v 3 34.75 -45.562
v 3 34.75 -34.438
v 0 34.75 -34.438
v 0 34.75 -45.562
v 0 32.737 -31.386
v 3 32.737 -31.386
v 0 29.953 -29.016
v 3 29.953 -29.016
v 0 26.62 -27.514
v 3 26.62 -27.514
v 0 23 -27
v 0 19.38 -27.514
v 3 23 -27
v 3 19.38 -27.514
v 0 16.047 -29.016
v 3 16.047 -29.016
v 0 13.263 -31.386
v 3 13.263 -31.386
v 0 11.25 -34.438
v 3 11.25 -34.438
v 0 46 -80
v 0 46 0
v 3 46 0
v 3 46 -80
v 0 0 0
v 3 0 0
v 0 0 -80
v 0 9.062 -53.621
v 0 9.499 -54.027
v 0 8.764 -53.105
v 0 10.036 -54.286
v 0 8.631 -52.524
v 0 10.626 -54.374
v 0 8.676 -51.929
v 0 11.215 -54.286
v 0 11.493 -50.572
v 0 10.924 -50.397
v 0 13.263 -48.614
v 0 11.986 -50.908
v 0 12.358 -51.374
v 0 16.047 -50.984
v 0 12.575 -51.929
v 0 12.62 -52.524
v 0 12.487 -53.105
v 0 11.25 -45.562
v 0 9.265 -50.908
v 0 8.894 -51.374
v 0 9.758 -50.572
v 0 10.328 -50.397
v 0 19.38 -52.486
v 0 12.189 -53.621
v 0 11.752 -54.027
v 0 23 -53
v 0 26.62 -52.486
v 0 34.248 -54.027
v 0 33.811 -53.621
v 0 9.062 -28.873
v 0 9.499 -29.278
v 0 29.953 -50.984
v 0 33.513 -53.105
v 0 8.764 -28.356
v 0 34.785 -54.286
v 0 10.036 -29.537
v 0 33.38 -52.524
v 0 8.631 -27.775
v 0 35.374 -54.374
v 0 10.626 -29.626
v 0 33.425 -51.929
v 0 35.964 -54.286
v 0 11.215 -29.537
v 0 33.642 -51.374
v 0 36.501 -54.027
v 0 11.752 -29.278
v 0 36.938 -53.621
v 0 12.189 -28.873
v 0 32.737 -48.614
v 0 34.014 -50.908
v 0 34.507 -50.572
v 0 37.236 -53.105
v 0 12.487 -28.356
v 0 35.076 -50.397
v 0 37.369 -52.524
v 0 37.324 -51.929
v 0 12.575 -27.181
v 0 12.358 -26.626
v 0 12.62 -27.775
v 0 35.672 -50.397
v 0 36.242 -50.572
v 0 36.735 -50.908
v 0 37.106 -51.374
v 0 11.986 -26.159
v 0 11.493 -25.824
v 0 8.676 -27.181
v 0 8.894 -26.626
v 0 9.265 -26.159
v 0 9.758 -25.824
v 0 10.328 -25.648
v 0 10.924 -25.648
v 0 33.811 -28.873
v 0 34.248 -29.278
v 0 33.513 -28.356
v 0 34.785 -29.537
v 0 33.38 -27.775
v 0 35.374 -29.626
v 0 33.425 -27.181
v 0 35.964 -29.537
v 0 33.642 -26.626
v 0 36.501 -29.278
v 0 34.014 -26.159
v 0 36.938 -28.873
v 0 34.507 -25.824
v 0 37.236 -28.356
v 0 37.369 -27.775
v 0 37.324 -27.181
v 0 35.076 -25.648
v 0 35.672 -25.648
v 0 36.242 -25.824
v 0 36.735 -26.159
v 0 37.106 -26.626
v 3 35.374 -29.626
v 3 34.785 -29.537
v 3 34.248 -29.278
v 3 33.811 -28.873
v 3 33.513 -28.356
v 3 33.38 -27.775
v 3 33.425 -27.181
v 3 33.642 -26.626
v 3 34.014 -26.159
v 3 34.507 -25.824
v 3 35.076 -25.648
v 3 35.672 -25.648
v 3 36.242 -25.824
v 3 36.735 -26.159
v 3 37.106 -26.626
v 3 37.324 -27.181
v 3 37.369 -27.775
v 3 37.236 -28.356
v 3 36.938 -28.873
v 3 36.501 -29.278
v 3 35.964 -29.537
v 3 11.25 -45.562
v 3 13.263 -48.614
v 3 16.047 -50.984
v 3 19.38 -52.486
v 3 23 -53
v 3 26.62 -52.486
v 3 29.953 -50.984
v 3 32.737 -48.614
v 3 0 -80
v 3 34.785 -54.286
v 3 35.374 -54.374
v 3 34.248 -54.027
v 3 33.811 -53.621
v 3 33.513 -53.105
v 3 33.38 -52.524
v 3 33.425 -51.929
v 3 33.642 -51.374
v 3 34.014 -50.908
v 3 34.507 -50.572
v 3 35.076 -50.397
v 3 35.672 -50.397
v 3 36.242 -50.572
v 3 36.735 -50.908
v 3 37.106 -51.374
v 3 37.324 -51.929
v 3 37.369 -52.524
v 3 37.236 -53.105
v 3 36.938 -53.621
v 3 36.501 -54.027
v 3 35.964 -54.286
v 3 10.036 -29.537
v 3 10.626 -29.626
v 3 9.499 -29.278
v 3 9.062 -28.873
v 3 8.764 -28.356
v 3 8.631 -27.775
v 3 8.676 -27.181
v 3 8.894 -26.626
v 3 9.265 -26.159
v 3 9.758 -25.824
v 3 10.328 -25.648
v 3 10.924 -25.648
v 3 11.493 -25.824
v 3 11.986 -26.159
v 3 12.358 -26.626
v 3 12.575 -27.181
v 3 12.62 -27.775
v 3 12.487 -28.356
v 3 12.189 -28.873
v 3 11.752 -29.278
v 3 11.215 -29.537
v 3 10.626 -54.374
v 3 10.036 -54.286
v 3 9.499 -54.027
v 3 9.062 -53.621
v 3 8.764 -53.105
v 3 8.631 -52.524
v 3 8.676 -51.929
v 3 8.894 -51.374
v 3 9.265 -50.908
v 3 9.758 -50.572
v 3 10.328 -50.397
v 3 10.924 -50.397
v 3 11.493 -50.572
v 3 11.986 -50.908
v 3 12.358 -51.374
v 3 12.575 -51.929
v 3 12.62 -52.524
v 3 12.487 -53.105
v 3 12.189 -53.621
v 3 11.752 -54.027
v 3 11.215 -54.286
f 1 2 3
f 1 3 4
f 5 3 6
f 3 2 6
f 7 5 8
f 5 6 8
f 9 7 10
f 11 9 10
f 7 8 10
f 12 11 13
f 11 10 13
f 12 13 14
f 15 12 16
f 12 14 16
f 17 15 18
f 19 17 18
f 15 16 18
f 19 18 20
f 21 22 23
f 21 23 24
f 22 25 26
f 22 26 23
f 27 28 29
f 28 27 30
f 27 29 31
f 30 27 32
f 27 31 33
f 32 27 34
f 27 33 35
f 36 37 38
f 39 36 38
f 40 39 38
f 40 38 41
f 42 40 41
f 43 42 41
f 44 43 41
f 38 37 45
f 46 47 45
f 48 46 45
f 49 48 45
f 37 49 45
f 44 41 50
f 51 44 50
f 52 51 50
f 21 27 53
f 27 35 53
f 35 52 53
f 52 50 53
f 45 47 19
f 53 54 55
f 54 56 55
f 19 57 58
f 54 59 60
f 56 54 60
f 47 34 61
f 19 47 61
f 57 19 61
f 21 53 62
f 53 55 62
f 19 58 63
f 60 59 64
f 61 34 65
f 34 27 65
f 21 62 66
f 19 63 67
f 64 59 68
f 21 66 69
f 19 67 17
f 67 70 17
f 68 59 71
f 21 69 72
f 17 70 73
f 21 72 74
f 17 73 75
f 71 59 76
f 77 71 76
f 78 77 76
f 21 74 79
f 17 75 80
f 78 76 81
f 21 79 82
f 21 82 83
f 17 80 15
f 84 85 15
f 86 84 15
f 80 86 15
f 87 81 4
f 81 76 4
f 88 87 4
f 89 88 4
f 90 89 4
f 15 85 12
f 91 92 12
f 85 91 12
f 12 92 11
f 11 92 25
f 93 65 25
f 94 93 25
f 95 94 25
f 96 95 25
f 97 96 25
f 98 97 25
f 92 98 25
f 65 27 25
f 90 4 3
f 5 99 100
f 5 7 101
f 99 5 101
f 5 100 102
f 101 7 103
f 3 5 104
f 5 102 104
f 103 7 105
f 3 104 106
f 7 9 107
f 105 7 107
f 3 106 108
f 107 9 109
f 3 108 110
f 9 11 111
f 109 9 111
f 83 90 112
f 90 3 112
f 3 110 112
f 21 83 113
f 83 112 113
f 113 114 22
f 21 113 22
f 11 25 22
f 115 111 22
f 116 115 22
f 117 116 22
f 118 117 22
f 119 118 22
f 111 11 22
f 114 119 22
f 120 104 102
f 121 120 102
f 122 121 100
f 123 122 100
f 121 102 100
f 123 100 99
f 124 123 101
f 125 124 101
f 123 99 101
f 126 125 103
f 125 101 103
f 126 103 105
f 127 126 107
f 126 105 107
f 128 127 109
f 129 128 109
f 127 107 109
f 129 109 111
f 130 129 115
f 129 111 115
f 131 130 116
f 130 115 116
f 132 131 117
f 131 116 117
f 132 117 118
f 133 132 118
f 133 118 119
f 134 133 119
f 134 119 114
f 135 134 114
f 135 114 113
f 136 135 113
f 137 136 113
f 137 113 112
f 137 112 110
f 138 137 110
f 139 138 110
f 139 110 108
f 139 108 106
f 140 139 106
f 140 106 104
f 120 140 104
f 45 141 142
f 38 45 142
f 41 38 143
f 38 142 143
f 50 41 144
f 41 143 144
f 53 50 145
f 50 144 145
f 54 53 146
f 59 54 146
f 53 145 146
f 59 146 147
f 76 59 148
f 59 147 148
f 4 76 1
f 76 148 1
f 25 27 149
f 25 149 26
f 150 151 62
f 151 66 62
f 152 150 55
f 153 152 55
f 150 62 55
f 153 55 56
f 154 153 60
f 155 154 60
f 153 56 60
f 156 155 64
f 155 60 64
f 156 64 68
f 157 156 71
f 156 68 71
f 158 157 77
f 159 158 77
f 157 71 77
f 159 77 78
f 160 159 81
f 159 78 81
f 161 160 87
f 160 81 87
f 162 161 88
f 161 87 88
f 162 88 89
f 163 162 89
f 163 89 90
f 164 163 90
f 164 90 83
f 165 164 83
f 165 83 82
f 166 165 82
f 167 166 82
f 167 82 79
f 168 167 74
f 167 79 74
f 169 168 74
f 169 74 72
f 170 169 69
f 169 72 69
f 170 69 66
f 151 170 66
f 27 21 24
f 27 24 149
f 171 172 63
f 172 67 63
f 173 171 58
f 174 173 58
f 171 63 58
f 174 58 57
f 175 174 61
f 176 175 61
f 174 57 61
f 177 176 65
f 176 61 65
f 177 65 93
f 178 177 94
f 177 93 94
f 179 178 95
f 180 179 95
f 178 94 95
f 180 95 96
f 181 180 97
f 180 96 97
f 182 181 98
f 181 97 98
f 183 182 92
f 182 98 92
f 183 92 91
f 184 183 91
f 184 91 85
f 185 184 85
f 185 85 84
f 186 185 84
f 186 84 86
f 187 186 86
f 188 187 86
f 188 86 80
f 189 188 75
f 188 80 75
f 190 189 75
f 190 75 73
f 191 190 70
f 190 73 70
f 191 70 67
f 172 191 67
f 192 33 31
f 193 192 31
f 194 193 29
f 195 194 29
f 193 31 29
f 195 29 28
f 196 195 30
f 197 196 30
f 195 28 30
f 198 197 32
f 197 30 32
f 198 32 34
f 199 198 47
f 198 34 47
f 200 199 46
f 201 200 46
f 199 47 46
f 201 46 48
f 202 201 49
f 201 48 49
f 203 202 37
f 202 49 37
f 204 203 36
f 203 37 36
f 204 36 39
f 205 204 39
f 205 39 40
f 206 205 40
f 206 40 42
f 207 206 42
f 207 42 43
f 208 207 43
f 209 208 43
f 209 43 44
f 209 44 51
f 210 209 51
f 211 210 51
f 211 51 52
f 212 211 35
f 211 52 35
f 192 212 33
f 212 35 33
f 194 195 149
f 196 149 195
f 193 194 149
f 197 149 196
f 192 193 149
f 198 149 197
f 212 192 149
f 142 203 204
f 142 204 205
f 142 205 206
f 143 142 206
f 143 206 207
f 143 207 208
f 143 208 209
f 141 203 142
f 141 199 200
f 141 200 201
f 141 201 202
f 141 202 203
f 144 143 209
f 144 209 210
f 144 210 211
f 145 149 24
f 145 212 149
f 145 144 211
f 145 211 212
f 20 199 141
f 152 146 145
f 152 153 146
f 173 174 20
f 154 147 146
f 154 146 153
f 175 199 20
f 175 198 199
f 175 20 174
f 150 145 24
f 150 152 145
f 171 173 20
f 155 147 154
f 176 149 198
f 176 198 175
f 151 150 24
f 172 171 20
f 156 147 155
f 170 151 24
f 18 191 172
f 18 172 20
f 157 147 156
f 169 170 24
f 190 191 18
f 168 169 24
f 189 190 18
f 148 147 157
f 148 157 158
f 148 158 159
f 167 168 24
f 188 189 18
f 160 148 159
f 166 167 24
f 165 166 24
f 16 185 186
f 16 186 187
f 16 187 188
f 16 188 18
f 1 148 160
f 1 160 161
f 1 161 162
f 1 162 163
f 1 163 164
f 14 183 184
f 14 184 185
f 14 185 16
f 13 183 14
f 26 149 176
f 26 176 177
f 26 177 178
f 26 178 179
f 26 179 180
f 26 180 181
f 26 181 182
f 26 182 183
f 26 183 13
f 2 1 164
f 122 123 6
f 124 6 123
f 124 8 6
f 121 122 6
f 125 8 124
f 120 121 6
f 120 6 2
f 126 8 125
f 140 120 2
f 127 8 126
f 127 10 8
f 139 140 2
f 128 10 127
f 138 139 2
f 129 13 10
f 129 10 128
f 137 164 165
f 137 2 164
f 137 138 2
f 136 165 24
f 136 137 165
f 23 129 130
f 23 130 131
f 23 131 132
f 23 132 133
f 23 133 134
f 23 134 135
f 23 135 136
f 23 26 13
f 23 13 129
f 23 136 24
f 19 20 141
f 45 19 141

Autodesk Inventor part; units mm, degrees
ref_plane "YZ Plane" through (0, 0, 0) normal (1, 0, 0) x (0, 1, 0)
ref_plane "XZ Plane" through (0, 0, 0) normal (0, 1, 0) x (-1, 0, 0)
ref_plane "XY Plane" through (0, 0, 0) normal (0, 0, 1) x (1, 0, 0)
sketch "スケッチ1" plane through (0, 0, 0) normal (1, 0, 0) x (0, 1, 0)
  line L0 (0, 0) -> (46, 0)
  line L1 (46, 0) -> (46, -80)
  line L2 (46, -80) -> (0, -80)
  line L3 (0, -80) -> (0, 0)
  dimension "d0" = 46
  dimension "d1" = 80
extrude "押し出し1" add sketch "スケッチ1" along normal blind 3
sketch "スケッチ2" plane through (3, 0, 0) normal (1, 0, 0) x (0, 0, -1)
  circle A0 centre (40, 23) radius 13
  line L0 (34.4379, 34.75) -> (45.5621, 34.75)
  line L1 (34.4379, 11.25) -> (45.5621, 11.25)
  line L2 (80, 46) -> (0, 46) projected
  line L3 (0, 46) -> (0, 0) projected
  dimension "d4" = 26
  dimension "d7" = 23
  dimension "d8" = 40
  dimension "d9" = 23.5
extrude "押し出し2" cut sketch "スケッチ2" against normal blind 3 contours A0 L1 L0
sketch "スケッチ3" plane through (3, 0, 0) normal (1, 0, 0) x (0, 0, -1)
  circle A0 centre (40, 23) radius 17.5 construction
  arc A1 (34.4379, 34.75) -> (34.4379, 11.25) centre (40, 23) ccw projected
  arc A2 (45.5621, 11.25) -> (45.5621, 34.75) centre (40, 23) ccw projected
  line L0 (22.5, 23) -> (57.5, 23) construction
  line L1 (40, 5.5) -> (40, 40.5) construction
  line L2 (40, 23) -> (52.3744, 35.3744) construction
  line L3 (40, 23) -> (57.5, 23) construction
  line L4 (52.3744, 35.3744) -> (27.6256, 10.6256) construction
  line L5 (40, 23) -> (52.3744, 10.6256) construction
  line L6 (27.6256, 35.3744) -> (40, 23) construction
  circle A3 centre (52.3744, 35.3744) radius 2.15
  circle A4 centre (52.3744, 10.6256) radius 2.15
  circle A5 centre (27.6256, 10.6256) radius 2.15
  circle A6 centre (27.6256, 35.3744) radius 2.15
  point P0 (0, 0)
  dimension "d12" = 35
  dimension "d13" = 45
  dimension "d14" = 4.3
  dimension "d15" = 4.3
  dimension "d16" = 4.3
  dimension "d17" = 4.3
hole "穴1" at (3, 35.3744, -27.6256) at (3, 35.3744, -52.3744) at (3, 10.6256, -52.3744) at (3, 10.6256, -27.6256) direction (-1, 0, 0) diameter 4 depth 3
equation "\"BendRadius\" = Thickness"
equation "\"BendReliefWidth\" = Thickness"
equation "\"BendReliefDepth\" = 0.5 * Thickness"
equation "\"CornerReliefSize\" = 4 * Thickness"
equation "\"MinimumRemnant\" = 2 * Thickness"
equation "\"TransitionRadius\" = BendRadius"
equation "\"JacobiRadiusSize\" = BendRadius"
equation "\"GapSize\" = Thickness"
equation "\"Thickness\" = 0.5"
properties part number "nhk28"
